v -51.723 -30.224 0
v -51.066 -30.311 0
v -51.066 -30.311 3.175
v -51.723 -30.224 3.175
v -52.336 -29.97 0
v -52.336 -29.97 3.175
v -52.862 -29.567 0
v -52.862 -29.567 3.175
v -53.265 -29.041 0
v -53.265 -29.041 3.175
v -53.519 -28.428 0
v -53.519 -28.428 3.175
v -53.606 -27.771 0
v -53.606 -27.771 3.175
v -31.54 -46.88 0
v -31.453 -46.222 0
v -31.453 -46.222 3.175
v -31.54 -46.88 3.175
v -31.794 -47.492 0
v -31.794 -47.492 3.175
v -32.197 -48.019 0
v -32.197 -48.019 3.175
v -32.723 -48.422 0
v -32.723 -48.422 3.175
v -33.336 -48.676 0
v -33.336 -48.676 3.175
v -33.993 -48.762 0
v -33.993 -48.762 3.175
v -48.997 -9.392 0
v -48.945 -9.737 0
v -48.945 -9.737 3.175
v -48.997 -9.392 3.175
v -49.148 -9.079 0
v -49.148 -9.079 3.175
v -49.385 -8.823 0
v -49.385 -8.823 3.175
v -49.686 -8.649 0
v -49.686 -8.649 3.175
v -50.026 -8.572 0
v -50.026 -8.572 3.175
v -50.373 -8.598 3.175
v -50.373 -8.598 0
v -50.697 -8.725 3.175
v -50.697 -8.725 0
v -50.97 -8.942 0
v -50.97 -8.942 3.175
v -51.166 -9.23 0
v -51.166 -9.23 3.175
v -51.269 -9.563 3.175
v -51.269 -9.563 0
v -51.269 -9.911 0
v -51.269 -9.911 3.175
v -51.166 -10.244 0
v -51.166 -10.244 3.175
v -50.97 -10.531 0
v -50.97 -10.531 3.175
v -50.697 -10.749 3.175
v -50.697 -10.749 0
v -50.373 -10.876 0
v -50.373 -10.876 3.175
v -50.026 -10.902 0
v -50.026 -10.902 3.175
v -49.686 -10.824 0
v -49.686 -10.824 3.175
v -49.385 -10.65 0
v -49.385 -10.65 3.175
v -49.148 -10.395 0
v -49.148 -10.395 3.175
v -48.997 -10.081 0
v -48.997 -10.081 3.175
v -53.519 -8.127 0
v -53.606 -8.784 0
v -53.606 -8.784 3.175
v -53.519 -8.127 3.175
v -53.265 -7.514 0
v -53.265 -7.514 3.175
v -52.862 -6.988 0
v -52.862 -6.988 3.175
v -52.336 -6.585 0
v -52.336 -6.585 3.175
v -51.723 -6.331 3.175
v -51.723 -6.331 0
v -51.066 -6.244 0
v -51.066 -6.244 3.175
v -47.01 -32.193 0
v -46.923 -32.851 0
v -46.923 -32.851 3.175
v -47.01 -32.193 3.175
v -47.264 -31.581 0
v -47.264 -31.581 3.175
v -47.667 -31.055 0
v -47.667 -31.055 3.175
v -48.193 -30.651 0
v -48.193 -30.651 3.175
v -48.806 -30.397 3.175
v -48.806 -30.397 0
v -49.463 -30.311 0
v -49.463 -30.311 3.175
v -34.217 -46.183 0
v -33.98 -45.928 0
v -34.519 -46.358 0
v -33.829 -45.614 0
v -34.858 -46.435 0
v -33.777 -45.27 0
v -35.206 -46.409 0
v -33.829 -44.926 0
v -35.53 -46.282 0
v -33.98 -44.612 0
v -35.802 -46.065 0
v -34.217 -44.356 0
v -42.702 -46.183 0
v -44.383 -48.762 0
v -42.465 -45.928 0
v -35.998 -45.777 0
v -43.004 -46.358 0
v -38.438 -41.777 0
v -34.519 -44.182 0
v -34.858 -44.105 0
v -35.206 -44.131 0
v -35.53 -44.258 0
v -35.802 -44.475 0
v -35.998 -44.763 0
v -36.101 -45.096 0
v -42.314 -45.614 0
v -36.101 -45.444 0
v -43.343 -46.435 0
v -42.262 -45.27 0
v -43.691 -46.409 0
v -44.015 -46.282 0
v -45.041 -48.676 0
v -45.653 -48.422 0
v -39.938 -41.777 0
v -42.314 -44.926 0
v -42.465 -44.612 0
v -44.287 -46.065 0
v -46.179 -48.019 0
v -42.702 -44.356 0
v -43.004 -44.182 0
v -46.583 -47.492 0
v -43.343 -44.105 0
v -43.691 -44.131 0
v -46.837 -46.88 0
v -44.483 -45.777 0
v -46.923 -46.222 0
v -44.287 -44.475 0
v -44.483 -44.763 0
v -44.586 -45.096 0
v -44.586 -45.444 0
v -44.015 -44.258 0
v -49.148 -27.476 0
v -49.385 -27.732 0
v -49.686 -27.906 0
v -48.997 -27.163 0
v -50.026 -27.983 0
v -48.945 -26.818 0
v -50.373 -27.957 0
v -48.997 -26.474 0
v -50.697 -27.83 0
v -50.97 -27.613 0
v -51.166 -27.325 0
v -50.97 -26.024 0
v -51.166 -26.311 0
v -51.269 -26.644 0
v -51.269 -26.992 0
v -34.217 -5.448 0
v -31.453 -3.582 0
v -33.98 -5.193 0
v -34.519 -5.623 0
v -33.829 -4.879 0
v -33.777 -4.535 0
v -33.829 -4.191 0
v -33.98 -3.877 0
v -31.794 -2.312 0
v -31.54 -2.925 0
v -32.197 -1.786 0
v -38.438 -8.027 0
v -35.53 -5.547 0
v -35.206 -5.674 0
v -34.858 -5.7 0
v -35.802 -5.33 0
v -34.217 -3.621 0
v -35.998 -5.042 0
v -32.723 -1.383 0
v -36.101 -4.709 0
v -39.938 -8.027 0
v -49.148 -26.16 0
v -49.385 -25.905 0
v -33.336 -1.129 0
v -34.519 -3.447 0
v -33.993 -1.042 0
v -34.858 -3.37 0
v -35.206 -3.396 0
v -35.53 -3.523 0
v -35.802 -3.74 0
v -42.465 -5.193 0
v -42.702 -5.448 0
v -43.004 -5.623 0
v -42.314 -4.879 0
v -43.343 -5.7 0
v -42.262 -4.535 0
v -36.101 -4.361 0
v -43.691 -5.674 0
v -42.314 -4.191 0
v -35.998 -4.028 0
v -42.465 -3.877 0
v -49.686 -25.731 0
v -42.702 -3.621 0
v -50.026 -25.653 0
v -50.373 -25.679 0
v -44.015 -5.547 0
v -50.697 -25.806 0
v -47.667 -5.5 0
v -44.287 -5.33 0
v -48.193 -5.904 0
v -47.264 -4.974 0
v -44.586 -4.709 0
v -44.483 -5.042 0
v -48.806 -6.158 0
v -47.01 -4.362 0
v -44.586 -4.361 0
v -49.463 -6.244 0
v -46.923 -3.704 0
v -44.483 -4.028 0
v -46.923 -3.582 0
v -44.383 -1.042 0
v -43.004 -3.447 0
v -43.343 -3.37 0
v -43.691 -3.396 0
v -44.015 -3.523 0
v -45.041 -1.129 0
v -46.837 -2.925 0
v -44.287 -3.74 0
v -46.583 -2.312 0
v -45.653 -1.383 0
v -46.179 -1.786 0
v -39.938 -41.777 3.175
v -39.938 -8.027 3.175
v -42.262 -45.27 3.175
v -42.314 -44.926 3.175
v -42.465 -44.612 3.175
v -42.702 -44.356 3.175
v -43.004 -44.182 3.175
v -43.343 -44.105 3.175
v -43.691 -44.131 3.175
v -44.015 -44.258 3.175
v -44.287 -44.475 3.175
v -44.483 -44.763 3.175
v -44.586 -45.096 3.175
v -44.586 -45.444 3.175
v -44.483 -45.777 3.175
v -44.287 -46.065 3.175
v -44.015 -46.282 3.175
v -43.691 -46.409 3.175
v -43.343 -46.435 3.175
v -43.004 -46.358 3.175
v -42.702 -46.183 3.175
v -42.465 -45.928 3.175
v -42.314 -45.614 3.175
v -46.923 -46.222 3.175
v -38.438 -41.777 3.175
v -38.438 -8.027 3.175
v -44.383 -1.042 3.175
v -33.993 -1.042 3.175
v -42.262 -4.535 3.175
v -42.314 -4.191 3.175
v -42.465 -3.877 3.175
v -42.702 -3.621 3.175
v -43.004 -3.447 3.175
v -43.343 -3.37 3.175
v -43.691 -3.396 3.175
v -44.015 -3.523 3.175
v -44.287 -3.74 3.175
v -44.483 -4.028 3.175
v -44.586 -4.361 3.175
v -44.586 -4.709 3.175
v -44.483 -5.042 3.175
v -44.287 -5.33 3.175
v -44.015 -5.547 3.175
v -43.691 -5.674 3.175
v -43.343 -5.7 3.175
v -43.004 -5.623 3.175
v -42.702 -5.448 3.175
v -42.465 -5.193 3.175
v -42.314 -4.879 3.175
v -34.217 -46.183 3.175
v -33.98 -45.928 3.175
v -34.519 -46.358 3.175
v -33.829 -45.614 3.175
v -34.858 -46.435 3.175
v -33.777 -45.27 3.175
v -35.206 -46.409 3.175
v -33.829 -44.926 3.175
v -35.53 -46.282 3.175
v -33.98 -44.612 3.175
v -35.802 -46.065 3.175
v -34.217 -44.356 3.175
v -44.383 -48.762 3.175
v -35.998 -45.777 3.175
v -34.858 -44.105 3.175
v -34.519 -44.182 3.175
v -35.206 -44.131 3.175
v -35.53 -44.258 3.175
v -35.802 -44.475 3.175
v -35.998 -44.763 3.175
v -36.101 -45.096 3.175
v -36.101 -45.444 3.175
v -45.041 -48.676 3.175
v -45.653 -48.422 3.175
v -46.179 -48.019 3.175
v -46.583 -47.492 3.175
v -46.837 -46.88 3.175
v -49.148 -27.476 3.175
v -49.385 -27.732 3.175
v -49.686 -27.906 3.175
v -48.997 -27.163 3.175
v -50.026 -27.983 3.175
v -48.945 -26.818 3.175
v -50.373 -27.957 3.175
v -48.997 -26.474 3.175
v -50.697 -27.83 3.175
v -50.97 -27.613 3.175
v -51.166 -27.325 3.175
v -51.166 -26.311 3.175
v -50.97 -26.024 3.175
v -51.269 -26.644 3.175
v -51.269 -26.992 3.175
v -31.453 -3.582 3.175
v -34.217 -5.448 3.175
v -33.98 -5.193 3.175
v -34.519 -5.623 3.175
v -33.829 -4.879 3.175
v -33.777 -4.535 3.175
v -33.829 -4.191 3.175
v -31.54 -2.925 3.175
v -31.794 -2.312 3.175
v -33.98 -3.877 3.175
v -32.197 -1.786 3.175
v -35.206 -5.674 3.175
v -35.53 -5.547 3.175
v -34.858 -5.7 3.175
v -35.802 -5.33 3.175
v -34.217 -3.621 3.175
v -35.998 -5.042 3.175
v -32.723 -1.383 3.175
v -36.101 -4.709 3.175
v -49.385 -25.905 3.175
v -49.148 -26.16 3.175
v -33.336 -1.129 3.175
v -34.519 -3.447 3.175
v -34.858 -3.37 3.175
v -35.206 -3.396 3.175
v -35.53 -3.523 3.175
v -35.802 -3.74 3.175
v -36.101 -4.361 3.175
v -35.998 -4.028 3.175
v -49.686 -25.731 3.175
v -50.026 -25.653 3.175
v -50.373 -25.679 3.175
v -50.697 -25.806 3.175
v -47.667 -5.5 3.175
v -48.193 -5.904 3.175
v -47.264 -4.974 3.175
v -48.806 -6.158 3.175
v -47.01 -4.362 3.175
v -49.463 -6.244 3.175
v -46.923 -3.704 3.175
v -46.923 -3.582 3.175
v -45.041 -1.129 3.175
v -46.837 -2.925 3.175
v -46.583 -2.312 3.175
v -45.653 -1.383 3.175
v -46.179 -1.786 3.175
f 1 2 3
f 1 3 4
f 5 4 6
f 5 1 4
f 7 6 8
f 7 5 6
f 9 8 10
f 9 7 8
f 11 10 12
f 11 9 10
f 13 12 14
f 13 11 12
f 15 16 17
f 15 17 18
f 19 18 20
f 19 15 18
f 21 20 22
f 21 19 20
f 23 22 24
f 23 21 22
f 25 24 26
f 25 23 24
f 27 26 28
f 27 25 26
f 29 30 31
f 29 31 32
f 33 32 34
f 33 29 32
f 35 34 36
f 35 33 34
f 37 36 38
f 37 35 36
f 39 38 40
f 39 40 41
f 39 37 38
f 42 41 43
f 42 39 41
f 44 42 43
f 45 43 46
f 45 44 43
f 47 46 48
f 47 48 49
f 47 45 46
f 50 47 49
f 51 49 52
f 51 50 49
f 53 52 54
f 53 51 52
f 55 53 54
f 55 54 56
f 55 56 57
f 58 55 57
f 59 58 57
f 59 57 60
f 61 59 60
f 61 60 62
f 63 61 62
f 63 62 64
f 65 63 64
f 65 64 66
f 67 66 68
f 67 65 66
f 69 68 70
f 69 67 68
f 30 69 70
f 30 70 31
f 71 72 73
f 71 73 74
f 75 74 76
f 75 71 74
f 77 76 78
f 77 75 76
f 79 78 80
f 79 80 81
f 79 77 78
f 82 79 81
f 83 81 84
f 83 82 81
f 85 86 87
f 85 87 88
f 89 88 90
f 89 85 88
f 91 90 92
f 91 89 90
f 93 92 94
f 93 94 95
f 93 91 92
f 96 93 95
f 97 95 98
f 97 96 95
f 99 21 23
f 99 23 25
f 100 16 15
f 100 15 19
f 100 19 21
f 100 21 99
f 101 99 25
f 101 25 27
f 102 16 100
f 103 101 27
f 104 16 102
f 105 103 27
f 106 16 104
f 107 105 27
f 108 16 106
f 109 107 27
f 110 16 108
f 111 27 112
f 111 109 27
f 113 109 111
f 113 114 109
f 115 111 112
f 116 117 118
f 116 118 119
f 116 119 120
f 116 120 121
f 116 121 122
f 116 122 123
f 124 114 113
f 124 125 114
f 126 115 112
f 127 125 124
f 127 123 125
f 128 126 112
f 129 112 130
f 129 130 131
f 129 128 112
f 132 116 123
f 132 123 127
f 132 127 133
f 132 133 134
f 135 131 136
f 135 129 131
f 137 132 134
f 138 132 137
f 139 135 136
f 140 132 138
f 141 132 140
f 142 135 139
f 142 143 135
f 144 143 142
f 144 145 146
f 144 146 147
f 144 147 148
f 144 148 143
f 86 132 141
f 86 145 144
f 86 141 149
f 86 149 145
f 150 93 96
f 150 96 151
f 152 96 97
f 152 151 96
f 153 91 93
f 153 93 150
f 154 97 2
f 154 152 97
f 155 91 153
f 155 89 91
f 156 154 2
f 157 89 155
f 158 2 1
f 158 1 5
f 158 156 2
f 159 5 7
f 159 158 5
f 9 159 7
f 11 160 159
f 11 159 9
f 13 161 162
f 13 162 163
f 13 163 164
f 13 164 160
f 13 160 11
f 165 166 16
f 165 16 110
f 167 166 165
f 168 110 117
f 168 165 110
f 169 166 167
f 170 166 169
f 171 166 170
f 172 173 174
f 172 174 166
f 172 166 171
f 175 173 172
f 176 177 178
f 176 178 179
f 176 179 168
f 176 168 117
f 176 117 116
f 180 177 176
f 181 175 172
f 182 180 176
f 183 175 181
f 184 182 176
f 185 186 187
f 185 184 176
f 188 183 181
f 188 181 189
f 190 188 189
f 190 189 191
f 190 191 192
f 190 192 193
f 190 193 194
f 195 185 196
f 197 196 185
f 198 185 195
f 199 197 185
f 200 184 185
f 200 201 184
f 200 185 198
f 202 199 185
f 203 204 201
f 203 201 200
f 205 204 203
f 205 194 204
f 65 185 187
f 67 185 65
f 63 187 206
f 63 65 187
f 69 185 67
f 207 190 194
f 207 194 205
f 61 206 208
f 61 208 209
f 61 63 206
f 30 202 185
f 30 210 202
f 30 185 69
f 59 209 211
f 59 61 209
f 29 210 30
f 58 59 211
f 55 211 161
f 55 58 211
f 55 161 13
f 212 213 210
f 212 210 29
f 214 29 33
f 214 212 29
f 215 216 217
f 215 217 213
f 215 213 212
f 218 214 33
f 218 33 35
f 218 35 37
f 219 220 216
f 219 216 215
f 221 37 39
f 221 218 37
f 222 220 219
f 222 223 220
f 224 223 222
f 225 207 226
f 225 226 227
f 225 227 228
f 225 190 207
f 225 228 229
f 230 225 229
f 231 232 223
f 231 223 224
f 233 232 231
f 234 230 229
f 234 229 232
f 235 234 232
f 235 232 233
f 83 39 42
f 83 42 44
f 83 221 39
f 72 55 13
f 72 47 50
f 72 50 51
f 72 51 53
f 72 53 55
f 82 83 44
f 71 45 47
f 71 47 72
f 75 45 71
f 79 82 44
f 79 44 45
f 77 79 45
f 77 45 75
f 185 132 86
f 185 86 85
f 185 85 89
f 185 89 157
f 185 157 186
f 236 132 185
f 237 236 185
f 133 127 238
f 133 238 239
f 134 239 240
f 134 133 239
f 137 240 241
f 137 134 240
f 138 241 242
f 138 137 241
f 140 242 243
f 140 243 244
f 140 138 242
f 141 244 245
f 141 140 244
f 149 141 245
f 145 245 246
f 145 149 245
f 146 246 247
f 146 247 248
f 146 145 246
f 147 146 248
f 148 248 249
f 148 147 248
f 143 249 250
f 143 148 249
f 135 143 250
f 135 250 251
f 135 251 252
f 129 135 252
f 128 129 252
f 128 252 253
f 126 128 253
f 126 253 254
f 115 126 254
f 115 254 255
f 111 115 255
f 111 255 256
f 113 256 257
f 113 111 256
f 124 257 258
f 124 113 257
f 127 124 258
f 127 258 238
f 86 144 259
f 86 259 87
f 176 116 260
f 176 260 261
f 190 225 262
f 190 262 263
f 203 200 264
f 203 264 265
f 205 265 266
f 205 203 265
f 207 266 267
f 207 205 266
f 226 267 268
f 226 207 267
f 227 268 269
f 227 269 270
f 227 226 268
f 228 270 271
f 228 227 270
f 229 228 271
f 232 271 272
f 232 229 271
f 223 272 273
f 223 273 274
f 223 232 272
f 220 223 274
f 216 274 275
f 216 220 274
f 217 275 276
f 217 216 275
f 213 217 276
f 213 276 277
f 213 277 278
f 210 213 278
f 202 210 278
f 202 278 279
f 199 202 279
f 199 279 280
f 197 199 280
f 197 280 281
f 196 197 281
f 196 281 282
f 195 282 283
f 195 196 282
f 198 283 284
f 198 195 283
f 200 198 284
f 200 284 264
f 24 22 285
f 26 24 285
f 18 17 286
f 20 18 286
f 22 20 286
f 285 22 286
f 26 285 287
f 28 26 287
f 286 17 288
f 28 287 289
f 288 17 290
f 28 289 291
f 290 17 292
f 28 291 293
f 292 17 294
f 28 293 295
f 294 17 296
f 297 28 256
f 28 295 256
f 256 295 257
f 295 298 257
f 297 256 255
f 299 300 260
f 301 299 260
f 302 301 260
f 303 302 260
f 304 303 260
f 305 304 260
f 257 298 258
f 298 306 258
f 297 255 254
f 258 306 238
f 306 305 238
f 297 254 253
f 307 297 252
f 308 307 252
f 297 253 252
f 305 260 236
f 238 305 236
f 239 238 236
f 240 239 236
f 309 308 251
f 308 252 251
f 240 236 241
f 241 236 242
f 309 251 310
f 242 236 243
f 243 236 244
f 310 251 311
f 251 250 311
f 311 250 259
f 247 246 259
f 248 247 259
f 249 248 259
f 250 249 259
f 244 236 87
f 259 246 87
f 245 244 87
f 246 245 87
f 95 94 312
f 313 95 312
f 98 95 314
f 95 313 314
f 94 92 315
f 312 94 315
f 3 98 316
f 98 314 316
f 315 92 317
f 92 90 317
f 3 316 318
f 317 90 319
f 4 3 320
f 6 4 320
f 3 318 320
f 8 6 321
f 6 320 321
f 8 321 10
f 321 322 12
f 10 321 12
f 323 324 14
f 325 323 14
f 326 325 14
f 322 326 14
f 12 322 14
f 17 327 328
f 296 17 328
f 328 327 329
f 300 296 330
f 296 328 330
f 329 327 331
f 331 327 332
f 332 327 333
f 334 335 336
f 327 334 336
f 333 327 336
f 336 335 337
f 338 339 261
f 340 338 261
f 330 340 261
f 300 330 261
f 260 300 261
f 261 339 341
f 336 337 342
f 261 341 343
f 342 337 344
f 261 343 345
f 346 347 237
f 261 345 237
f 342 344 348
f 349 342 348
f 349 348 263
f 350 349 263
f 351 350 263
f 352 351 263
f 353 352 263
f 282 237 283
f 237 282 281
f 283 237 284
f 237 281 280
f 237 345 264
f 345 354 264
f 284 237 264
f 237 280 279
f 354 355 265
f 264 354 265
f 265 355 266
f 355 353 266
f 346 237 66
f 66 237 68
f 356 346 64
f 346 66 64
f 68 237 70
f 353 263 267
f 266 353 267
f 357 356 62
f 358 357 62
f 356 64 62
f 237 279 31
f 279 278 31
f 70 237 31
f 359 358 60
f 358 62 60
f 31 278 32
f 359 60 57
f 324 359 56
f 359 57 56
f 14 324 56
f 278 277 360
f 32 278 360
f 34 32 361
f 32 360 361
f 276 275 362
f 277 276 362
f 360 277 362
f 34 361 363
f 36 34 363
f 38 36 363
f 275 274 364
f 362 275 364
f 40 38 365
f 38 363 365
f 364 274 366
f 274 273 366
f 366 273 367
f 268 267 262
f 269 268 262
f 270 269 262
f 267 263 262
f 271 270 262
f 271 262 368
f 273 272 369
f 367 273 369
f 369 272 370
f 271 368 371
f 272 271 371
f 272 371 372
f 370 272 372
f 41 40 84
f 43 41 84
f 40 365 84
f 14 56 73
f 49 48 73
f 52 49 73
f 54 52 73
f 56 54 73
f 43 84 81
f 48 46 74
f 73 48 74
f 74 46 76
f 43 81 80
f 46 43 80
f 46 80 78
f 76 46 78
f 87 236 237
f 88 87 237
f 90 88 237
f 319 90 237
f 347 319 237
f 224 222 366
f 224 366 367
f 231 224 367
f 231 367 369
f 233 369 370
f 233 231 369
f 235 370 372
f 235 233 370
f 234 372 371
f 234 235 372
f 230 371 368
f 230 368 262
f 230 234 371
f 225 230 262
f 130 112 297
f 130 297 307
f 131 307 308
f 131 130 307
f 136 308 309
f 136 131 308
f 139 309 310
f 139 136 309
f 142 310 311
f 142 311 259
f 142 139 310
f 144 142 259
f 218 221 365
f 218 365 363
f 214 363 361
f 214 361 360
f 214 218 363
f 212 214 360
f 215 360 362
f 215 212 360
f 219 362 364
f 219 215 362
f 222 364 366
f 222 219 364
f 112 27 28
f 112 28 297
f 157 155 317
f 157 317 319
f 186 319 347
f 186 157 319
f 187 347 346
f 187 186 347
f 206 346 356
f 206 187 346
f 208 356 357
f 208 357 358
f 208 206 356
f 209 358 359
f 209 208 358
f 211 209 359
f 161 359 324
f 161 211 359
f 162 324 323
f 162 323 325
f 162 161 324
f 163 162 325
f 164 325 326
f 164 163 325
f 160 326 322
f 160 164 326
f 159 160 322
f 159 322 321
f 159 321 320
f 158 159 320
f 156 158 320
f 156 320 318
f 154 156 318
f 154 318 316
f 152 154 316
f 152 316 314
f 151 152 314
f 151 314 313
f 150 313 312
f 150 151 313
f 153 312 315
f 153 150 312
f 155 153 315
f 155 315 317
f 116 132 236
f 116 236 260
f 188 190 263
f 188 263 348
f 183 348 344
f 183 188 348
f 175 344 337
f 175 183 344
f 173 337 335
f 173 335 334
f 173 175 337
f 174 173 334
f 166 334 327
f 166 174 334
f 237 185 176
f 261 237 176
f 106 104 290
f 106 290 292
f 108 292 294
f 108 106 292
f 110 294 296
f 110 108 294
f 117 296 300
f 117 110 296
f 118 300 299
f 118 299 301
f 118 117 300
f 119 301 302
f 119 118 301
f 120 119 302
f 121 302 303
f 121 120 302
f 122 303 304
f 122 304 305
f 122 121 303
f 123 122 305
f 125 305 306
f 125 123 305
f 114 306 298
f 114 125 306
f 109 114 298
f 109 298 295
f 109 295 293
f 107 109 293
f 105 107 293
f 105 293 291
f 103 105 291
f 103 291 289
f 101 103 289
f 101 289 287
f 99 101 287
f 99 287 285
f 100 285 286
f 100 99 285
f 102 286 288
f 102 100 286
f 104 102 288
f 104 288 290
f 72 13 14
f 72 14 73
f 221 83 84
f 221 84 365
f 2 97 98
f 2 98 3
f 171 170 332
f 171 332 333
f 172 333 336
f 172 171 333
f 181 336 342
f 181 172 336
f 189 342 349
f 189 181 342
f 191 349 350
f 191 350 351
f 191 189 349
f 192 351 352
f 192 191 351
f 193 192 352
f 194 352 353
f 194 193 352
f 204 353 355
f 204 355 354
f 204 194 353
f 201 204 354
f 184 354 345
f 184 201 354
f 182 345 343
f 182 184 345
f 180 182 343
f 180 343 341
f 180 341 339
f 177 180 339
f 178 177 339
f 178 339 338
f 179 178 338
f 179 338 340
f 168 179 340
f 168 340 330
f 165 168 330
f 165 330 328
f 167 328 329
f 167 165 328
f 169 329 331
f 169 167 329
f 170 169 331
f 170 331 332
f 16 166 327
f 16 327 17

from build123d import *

# Parameters (mm, degrees)
SKETCH1_R           = 1.1684
SKETCH1_W           = 1.5
SKETCH1_H           = 33.75
BOSS_EXTRUDE1_DEPTH = 3.175


with BuildPart() as part:
    # Sketch1 → Boss-Extrude1 (new body)
    with BuildSketch(Plane.XY):
        with BuildLine():
            Line((-31.453240404, -3.582490692), (-31.453240404, -46.222490692))
            ThreePointArc((-31.453240404, -46.222490692), (-32.197189179, -48.018541916), (-33.993240404, -48.762490692))
            Line((-33.993240404, -48.762490692), (-44.383240404, -48.762490692))
            ThreePointArc((-44.383240404, -48.762490692), (-46.179291628, -48.018541916), (-46.923240404, -46.222490692))
            Line((-46.923240404, -46.222490692), (-46.923240404, -32.850740692))
            ThreePointArc((-46.923240404, -32.850740692), (-47.667189179, -31.054689467), (-49.463240404, -30.310740692))
            Line((-49.463240404, -30.310740692), (-51.065740404, -30.310740692))
            ThreePointArc((-51.065740404, -30.310740692), (-52.861791628, -29.566791916), (-53.605740404, -27.770740692))
            Line((-53.605740404, -27.770740692), (-53.605740404, -8.784240692))
            ThreePointArc((-53.605740404, -8.784240692), (-52.861791628, -6.988189467), (-51.065740404, -6.244240692))
            Line((-51.065740404, -6.244240692), (-49.463240404, -6.244240692))
            ThreePointArc((-49.463240404, -6.244240692), (-47.667189179, -5.500291916), (-46.923240404, -3.704240692))
            Line((-46.923240404, -3.704240692), (-46.923240404, -3.582490692))
            ThreePointArc((-46.923240404, -3.582490692), (-46.179291628, -1.786439467), (-44.383240404, -1.042490692))
            Line((-44.383240404, -1.042490692), (-33.993240404, -1.042490692))
            ThreePointArc((-33.993240404, -1.042490692), (-32.197189179, -1.786439467), (-31.453240404, -3.582490692))
        make_face()
        with Locations((-43.430740404, -4.534990692)):
            Circle(SKETCH1_R, mode=Mode.SUBTRACT)
        with Locations((-34.945740404, -4.534990692)):
            Circle(SKETCH1_R, mode=Mode.SUBTRACT)
        with Locations((-43.430740404, -45.269990692)):
            Circle(SKETCH1_R, mode=Mode.SUBTRACT)
        with Locations((-34.945740404, -45.269990692)):
            Circle(SKETCH1_R, mode=Mode.SUBTRACT)
        with Locations((-50.113240404, -9.736740692)):
            Circle(SKETCH1_R, mode=Mode.SUBTRACT)
        with Locations((-50.113240404, -26.818240692)):
            Circle(SKETCH1_R, mode=Mode.SUBTRACT)
        with Locations((-39.188240404, -24.902490692)):
            Rectangle(SKETCH1_W, SKETCH1_H, mode=Mode.SUBTRACT)
    extrude(amount=BOSS_EXTRUDE1_DEPTH)


solid = part.part
